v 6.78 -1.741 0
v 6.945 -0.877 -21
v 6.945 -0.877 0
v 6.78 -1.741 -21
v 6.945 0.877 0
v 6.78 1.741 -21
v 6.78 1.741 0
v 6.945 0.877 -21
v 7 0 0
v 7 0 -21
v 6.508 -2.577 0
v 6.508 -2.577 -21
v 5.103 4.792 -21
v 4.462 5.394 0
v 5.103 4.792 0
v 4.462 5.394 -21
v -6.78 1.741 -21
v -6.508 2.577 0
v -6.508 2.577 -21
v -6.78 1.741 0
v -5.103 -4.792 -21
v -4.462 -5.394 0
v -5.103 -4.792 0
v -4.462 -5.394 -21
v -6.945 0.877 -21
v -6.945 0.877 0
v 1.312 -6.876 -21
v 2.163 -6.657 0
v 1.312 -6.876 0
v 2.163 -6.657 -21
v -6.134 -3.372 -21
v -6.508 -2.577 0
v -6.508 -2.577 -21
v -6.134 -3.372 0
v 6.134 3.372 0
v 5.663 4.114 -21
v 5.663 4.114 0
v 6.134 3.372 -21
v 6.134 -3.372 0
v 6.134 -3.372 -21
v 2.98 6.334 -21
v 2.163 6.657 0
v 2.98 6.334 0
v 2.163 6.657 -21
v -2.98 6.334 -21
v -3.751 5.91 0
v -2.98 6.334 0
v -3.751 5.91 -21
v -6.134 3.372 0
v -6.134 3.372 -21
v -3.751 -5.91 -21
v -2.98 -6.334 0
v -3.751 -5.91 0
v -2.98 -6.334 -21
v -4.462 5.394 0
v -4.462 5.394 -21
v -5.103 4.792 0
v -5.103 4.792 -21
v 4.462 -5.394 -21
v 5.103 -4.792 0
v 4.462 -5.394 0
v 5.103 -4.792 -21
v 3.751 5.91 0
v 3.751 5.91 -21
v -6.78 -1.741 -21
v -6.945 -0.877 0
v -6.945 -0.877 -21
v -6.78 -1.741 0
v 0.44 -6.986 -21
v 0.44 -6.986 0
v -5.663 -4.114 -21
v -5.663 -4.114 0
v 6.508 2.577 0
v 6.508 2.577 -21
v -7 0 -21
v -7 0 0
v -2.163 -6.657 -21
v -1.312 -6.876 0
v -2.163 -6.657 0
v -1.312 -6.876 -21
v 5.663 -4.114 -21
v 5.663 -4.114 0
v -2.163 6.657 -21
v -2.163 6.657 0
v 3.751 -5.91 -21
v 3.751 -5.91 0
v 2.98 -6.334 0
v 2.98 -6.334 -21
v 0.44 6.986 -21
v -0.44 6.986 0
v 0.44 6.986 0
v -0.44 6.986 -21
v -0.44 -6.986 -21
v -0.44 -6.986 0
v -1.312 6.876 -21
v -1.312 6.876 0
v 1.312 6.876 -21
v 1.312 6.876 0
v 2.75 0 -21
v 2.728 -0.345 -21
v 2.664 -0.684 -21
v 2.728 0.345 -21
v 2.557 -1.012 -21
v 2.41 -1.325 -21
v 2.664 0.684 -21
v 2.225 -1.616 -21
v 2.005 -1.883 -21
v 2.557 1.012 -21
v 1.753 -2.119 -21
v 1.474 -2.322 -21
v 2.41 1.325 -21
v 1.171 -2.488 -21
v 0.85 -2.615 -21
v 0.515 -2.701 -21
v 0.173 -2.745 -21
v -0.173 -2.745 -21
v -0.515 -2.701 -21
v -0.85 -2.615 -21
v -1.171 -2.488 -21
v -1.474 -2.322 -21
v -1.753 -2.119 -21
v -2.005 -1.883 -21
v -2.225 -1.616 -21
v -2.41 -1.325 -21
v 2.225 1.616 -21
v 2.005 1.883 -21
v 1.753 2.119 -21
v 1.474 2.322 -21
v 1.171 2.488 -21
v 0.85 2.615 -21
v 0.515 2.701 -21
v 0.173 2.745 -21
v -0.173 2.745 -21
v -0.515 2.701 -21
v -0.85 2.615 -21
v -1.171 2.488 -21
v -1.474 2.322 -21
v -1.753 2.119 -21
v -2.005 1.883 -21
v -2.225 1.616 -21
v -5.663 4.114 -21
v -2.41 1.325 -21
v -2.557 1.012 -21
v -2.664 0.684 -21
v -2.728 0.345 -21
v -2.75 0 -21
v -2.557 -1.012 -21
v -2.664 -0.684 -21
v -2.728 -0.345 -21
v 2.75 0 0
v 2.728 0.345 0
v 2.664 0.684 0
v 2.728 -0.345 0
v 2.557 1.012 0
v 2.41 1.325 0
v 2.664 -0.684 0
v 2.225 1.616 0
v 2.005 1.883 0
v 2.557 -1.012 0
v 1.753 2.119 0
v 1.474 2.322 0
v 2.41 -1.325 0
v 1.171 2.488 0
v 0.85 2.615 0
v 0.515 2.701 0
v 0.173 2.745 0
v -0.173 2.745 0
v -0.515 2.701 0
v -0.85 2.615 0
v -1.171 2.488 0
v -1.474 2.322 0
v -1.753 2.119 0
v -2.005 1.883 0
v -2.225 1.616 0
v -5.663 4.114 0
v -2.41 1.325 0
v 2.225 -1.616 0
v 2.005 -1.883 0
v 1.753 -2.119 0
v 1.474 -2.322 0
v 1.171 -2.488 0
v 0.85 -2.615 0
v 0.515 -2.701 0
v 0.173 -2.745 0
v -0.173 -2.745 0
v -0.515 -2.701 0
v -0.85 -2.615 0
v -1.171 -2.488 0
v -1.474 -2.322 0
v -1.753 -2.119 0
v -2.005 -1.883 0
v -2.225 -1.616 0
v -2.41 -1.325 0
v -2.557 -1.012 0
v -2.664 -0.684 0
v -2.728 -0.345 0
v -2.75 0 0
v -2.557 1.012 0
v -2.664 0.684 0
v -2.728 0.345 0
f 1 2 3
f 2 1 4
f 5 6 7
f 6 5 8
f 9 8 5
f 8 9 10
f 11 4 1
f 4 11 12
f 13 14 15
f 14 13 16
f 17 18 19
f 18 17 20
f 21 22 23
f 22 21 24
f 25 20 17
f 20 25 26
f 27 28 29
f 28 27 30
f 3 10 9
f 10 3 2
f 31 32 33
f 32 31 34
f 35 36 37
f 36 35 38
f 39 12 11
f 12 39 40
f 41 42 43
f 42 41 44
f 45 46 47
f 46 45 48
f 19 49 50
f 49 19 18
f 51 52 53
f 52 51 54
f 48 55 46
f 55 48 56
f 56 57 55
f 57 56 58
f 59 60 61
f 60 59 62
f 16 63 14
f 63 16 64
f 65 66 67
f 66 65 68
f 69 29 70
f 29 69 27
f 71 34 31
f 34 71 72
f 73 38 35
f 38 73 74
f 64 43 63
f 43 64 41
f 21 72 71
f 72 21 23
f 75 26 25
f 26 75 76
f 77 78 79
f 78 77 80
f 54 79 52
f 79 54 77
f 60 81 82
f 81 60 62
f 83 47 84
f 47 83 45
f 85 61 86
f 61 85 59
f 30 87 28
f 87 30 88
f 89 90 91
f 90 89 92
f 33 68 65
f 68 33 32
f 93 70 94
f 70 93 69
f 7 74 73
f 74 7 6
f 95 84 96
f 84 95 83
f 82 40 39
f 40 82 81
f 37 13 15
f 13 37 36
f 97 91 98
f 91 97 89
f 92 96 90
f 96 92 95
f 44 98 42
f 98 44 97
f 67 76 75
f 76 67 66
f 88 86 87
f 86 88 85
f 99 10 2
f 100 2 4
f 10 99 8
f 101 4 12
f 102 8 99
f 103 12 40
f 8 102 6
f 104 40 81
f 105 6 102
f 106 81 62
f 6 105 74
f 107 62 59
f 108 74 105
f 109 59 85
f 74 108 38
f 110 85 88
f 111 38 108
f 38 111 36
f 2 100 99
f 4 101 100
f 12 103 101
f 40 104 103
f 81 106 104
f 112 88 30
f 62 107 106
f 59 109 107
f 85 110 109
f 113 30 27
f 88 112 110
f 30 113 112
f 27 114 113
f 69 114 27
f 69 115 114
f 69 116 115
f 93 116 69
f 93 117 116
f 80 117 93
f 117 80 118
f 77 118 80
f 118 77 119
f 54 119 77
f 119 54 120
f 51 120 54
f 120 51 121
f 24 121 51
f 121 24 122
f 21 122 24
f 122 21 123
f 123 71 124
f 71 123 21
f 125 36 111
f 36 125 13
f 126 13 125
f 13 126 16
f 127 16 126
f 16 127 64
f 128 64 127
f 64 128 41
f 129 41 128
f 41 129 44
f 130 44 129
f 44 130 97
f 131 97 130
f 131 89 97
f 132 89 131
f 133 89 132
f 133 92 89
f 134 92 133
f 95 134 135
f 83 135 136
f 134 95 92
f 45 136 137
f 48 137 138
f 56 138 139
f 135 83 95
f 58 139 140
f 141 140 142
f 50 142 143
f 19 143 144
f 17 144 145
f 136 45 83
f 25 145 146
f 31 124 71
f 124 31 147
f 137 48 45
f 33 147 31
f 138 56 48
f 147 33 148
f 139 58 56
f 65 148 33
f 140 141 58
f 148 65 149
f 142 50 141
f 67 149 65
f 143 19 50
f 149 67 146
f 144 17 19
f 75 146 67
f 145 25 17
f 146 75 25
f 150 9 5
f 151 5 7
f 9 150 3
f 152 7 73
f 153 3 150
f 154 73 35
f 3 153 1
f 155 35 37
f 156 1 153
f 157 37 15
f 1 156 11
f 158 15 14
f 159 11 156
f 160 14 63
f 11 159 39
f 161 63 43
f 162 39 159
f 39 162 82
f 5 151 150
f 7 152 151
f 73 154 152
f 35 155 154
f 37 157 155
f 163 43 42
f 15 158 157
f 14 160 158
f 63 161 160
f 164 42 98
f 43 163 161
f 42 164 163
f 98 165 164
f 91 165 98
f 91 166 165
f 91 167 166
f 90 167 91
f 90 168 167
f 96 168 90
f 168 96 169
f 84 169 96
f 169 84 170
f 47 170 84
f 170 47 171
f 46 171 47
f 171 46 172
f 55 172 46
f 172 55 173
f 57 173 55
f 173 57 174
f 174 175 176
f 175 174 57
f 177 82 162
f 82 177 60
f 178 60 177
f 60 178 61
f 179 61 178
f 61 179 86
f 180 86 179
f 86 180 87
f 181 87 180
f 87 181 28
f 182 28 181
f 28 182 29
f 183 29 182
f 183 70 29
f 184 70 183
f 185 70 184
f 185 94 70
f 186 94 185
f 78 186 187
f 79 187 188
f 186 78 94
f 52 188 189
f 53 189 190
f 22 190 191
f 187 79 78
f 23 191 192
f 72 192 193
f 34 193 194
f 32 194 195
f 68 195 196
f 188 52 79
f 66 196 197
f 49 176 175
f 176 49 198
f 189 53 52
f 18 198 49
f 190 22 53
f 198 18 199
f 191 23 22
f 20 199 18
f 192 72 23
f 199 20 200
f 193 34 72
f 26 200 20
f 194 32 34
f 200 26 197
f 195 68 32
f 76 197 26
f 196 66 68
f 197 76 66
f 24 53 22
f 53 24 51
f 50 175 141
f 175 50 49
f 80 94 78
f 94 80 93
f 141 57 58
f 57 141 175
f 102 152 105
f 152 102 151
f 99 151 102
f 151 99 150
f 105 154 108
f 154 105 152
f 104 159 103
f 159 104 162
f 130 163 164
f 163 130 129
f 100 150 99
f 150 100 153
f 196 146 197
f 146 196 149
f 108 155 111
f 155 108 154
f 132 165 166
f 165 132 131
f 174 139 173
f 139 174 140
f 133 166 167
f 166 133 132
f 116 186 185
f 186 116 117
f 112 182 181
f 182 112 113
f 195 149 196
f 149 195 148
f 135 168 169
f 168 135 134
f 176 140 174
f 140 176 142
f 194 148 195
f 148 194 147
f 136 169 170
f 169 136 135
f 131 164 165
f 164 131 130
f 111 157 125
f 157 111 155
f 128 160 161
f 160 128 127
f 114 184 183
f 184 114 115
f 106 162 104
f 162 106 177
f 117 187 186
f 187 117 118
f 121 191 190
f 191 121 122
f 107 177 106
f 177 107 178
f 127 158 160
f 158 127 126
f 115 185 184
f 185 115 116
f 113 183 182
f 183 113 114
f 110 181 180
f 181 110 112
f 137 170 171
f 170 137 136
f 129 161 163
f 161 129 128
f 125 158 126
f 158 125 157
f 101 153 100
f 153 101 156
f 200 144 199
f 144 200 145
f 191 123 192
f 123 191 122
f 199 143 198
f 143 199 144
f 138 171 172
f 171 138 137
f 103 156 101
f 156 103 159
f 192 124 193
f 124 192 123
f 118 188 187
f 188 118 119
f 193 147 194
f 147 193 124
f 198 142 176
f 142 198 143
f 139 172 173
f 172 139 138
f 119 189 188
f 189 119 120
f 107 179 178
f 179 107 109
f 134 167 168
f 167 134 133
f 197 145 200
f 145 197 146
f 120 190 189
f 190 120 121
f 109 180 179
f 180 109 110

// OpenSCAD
$fn = 50;


difference() {
	union() {
		translate(v = [0, 0, -21.0000000000]) {
			cylinder(h = 21, r = 7.0000000000);
		}
		cylinder(h = 0, r = 16.0000000000);
	}
	union() {
		#translate(v = [0, 0, -21]) {
			cylinder(h = 21, r = 2.7500000000);
		}
	}
}
